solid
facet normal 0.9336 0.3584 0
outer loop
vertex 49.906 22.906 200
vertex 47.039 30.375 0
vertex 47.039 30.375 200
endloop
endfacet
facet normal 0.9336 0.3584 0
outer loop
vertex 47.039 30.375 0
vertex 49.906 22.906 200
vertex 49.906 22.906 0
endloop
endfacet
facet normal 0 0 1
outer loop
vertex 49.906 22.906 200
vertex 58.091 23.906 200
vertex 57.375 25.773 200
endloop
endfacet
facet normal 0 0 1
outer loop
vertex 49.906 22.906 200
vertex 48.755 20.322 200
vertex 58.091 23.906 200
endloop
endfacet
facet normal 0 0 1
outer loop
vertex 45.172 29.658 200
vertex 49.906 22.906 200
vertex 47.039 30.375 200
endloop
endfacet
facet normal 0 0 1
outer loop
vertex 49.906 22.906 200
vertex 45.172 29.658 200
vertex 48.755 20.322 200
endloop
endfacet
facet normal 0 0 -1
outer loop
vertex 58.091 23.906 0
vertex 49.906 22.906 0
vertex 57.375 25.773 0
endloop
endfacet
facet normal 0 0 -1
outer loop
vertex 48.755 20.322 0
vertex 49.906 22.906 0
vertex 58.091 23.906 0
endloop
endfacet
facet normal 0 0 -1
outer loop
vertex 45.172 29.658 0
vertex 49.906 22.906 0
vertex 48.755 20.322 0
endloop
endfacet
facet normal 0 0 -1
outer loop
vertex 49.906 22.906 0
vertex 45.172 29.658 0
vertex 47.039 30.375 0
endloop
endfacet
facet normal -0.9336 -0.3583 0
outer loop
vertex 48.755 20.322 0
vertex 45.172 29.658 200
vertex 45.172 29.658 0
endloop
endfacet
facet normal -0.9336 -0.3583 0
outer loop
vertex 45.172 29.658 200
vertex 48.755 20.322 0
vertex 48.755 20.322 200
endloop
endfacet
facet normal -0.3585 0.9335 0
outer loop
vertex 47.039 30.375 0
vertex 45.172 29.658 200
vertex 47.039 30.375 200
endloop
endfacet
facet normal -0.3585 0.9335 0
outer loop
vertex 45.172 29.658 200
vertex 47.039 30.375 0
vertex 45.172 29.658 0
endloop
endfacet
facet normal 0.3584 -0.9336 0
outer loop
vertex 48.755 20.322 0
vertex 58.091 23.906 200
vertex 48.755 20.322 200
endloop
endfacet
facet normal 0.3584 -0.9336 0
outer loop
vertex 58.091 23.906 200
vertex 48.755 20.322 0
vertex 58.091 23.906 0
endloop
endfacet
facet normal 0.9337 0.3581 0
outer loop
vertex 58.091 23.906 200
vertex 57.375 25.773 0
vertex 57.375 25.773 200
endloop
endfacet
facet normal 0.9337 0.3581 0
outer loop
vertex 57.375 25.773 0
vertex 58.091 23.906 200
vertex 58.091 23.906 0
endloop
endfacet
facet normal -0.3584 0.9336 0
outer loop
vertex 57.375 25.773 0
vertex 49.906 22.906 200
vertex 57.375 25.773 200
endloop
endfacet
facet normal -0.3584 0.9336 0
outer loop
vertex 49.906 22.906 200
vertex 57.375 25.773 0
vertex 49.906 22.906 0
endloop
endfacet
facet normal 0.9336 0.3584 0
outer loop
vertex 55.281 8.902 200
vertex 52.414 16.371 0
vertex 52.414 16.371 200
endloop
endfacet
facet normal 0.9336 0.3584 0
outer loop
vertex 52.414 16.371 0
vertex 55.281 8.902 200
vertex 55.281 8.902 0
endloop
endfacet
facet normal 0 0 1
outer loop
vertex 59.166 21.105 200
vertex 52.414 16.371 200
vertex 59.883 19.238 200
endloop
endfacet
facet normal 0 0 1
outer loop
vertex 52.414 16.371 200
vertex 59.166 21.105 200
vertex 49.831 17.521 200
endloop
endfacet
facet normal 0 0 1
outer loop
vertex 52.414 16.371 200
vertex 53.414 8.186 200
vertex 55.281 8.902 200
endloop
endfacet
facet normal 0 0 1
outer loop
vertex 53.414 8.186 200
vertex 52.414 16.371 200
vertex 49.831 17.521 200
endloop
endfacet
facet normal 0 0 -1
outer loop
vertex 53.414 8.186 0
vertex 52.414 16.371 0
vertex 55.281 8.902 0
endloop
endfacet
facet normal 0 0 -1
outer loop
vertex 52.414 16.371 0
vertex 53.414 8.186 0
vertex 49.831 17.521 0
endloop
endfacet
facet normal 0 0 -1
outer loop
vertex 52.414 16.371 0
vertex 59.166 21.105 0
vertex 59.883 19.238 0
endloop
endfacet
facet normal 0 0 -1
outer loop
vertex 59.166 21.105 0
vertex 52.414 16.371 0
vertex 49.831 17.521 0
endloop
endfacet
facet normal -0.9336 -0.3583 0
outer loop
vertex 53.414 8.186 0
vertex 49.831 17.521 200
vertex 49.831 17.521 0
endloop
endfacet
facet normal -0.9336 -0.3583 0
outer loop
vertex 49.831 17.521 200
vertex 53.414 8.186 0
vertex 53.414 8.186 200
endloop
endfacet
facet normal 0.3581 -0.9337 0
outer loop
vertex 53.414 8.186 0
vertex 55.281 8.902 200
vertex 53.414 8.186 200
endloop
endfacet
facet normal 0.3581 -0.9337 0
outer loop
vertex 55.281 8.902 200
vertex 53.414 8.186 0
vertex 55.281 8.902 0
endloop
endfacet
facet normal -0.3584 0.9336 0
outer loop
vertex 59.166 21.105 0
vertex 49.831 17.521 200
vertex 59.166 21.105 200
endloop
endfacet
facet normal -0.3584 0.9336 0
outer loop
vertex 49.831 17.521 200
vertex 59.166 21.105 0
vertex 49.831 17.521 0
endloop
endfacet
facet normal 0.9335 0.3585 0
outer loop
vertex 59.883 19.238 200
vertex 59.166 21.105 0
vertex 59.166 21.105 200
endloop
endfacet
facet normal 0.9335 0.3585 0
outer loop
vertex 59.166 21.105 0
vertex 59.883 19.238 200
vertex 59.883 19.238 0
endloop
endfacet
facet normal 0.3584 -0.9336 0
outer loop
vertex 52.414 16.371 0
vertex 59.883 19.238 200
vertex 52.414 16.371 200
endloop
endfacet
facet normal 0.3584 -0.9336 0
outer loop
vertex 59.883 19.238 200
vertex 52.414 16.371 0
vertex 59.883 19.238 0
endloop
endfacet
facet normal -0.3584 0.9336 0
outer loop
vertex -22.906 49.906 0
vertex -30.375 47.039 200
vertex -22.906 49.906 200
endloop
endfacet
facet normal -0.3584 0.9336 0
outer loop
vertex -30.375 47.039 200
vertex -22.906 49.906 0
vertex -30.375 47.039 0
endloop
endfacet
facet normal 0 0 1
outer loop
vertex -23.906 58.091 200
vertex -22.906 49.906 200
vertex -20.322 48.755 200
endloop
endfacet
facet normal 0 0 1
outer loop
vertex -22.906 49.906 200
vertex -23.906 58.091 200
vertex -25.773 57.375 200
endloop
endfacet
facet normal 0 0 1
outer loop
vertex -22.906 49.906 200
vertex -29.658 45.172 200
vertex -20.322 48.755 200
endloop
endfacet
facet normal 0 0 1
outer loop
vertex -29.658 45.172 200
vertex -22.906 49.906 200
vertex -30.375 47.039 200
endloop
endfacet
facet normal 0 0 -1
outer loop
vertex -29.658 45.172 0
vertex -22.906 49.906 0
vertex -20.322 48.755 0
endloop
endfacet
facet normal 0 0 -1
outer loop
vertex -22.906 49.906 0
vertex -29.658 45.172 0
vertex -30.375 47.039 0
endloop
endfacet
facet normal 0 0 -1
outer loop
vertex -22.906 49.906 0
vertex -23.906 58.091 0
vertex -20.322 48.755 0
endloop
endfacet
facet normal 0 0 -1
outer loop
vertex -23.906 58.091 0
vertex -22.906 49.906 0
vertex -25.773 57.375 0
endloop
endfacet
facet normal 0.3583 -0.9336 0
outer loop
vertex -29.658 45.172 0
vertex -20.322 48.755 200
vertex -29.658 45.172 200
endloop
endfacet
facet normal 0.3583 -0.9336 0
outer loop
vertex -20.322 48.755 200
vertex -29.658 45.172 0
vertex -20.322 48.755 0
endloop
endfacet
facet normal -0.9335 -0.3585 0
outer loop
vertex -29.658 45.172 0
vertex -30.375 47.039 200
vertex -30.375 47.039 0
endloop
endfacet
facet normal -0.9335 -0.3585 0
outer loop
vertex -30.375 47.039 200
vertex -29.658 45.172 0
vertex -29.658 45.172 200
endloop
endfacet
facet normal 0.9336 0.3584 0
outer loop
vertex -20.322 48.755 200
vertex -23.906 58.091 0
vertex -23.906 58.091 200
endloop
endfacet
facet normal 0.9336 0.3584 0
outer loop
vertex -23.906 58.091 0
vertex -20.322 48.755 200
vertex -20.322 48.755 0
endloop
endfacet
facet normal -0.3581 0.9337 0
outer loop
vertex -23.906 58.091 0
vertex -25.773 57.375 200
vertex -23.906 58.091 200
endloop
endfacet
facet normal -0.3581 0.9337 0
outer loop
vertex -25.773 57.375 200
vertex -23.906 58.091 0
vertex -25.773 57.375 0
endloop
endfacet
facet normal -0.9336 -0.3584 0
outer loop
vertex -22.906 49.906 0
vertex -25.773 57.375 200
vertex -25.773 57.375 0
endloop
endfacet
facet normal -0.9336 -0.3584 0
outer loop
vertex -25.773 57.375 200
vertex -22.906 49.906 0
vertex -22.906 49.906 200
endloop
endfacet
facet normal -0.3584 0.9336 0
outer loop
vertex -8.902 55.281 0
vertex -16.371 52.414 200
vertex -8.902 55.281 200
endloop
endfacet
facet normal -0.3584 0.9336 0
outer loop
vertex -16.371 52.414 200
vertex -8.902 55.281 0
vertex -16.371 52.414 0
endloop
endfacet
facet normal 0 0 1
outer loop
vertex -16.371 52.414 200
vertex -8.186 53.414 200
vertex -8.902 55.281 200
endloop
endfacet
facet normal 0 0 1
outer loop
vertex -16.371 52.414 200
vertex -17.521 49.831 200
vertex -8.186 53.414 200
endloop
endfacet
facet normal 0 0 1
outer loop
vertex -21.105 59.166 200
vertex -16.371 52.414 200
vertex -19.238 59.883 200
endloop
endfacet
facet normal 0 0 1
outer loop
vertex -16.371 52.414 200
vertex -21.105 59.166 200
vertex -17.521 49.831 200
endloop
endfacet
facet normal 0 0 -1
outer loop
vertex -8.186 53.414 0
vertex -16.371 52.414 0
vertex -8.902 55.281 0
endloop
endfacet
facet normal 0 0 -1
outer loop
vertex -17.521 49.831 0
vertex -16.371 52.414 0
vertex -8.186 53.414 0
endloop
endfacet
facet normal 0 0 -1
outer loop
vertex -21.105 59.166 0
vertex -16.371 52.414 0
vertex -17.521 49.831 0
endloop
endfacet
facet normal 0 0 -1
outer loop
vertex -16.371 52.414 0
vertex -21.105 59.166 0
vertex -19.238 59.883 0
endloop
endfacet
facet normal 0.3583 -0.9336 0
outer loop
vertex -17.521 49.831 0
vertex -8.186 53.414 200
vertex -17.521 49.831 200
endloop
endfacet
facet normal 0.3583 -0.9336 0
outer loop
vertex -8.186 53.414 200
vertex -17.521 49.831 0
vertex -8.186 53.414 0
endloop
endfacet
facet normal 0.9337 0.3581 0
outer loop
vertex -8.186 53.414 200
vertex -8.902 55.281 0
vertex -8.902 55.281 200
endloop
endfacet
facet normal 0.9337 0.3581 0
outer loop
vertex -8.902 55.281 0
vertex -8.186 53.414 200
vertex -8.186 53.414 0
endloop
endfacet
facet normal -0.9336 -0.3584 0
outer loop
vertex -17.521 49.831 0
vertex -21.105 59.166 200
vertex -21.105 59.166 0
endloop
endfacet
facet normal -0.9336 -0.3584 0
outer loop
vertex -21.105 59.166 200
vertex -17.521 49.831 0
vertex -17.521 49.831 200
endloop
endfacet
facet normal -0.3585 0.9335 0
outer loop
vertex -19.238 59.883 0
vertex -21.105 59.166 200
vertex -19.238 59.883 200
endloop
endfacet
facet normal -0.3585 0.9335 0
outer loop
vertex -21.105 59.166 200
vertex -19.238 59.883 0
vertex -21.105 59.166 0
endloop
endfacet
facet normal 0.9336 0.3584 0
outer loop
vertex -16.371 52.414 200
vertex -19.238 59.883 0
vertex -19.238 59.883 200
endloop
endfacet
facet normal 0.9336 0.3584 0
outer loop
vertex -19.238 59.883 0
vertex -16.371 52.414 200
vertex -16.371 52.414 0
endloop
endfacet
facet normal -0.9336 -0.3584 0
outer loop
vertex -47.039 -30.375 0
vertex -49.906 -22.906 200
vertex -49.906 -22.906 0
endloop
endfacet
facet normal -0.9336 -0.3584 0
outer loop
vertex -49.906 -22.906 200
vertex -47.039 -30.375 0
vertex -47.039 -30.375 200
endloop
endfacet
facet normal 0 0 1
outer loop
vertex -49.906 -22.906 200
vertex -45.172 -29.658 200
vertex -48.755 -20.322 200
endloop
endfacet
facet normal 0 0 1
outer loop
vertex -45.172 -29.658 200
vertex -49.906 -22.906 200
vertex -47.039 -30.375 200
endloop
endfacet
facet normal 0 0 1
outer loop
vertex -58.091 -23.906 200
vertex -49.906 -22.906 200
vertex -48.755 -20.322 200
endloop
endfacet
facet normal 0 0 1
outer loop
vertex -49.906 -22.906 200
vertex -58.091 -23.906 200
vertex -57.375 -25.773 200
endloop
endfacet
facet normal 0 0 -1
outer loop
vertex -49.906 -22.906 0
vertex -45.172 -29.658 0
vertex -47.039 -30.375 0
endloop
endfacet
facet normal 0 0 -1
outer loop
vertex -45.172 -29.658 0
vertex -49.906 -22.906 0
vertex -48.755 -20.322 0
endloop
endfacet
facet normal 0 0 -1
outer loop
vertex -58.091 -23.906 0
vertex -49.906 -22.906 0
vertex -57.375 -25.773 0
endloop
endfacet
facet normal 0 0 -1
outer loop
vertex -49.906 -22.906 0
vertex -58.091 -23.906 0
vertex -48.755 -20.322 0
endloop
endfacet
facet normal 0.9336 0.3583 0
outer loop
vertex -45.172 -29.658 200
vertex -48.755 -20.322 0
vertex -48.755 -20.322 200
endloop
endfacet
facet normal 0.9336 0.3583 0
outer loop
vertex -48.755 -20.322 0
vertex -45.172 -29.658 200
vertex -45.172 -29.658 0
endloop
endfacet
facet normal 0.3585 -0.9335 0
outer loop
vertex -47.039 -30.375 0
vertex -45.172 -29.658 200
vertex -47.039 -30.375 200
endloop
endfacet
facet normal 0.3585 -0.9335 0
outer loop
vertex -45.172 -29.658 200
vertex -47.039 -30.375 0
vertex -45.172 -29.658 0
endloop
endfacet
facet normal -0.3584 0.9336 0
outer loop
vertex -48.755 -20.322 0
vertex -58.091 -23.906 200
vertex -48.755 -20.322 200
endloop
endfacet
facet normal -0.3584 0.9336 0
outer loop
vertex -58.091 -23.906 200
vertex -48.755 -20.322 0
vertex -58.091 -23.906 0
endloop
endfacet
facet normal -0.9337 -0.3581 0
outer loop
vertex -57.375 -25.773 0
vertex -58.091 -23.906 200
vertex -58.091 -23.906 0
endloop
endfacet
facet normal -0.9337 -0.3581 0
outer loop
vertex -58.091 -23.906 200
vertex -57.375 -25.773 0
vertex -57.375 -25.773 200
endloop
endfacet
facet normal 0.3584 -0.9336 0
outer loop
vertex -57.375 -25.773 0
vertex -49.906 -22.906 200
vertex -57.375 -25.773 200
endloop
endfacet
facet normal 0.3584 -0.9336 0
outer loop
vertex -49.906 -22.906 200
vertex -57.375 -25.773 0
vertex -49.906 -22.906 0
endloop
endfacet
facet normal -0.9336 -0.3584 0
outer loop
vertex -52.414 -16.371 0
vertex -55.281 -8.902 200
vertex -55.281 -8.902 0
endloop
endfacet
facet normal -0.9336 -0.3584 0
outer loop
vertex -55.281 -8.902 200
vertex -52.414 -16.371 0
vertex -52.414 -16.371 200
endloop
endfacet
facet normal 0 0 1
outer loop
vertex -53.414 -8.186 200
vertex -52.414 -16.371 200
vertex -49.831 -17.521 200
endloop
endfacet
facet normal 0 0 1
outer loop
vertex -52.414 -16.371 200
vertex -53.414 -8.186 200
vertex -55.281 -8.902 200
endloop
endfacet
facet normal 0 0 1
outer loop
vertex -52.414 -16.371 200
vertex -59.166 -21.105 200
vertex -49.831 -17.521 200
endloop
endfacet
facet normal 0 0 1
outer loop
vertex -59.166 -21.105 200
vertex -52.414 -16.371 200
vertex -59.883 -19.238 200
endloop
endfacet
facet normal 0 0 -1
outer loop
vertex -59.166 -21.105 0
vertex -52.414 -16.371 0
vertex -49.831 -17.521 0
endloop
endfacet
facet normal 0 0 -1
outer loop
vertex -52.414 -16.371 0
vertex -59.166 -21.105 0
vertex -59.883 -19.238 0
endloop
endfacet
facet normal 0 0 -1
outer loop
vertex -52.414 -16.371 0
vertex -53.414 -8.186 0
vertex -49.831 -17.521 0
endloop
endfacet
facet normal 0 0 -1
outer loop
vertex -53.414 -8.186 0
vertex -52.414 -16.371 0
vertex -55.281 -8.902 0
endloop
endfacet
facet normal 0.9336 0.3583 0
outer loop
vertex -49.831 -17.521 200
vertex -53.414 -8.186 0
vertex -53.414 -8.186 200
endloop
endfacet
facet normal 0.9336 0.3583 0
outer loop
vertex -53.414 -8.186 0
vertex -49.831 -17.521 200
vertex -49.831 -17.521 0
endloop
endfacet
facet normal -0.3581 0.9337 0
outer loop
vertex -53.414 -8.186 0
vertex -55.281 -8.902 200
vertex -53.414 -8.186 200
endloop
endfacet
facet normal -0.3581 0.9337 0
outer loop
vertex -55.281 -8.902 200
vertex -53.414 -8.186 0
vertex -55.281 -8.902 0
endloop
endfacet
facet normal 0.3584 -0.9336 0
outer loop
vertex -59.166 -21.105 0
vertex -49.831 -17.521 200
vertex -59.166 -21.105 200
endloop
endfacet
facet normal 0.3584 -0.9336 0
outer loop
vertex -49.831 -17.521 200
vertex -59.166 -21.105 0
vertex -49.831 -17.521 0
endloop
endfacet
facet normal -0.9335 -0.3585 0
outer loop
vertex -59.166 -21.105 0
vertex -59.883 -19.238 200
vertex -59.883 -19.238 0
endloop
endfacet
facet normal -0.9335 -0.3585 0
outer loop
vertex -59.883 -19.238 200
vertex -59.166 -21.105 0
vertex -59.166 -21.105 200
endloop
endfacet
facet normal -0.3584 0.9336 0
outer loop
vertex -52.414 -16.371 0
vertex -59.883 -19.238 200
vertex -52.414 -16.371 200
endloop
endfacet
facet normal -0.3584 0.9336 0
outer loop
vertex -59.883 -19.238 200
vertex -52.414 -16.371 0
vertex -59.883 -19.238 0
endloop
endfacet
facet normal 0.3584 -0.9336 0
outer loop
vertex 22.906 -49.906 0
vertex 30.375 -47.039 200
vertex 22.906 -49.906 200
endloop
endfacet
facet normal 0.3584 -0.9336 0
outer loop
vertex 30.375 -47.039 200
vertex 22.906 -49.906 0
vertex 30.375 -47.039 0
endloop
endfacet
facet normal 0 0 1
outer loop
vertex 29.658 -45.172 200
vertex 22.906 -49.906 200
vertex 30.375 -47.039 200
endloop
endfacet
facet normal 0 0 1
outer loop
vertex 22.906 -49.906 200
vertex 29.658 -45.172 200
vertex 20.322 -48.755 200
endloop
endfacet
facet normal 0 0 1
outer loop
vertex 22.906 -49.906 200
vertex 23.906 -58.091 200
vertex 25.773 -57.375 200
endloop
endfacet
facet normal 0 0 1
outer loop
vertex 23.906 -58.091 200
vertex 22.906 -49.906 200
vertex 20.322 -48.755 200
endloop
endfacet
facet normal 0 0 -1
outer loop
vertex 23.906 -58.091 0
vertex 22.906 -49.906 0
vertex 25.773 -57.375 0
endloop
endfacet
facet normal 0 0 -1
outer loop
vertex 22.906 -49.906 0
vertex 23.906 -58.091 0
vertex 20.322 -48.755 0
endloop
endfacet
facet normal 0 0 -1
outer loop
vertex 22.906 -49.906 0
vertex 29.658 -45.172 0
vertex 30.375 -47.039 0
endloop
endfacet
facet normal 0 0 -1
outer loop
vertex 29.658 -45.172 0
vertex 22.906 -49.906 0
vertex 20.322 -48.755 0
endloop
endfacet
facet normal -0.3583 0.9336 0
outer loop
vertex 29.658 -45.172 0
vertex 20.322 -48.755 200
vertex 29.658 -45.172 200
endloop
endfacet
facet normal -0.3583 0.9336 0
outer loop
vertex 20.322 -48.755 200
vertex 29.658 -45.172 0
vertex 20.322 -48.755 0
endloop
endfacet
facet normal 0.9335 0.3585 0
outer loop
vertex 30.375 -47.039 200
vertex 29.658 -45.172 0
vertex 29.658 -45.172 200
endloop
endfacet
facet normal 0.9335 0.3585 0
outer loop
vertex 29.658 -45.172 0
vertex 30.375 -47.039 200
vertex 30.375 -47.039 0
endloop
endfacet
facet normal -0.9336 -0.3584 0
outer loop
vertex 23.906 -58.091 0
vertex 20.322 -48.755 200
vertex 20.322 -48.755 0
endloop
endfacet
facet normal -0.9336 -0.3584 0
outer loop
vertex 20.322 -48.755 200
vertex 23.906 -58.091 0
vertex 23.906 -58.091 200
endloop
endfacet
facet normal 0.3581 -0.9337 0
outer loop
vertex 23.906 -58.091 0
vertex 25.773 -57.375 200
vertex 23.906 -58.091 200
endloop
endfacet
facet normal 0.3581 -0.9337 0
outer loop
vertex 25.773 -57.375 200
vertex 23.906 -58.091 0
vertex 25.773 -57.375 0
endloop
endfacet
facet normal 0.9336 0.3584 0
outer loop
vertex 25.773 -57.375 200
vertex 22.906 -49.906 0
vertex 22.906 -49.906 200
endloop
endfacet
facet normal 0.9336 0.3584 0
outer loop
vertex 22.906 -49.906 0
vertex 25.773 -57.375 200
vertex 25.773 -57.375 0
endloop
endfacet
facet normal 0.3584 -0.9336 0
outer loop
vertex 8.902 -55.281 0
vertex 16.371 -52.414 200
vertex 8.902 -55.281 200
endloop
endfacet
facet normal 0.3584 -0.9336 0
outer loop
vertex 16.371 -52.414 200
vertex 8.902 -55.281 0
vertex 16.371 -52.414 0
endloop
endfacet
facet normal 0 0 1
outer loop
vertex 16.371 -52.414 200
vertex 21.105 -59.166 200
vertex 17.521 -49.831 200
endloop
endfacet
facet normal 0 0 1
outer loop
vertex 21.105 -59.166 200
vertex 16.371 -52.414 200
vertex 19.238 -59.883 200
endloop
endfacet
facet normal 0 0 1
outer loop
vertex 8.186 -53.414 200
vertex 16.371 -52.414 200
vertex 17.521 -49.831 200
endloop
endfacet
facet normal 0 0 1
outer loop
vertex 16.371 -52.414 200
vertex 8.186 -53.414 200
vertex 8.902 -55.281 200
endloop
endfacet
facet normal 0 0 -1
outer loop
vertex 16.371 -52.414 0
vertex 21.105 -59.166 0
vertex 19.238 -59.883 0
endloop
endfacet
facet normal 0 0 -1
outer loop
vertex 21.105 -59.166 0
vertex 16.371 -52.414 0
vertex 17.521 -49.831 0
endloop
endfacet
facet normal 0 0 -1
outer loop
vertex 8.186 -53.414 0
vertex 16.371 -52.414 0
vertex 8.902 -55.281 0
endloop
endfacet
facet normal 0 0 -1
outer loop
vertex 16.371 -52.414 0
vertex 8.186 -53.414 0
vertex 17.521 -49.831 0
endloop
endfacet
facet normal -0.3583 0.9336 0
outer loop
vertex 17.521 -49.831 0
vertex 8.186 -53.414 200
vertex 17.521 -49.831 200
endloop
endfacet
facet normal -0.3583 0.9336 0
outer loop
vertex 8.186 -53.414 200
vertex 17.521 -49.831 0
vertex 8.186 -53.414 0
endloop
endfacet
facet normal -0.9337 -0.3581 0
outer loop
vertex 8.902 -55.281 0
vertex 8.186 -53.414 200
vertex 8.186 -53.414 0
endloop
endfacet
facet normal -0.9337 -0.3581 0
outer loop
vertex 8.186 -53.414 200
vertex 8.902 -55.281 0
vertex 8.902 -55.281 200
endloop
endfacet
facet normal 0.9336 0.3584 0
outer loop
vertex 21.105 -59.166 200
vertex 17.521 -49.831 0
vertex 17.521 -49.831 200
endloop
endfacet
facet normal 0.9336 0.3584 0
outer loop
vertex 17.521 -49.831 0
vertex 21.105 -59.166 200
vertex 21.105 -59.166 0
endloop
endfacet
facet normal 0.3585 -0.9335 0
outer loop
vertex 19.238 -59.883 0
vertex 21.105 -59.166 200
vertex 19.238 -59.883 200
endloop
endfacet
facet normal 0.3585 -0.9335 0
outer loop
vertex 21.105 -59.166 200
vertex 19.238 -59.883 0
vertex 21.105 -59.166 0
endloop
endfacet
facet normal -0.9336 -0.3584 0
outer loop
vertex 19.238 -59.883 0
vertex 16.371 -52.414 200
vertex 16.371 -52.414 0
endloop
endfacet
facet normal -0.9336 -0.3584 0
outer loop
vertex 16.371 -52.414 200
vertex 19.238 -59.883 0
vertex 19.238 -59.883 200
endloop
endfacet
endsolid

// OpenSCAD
// file: config.scad
$fn = 160;

body_height = 1800;
skin_int_dia = 110;

wings_thickness = 3;
wings_nb = 4;
wings_m = 200;
wings_n = 130;
wings_p = 127;
wings_E = 138;

ring_ext_dia = skin_int_dia - 0.4;
// main file
include <config.scad>;

module wing_brackets() {
     n = wings_nb;
     diameter = 10;

     module bracket() {
          translate([0, wings_thickness/2, 0]) {
               cube([2, 10, 200]);
               cube([10, 2, 200]);
          }
     }

     for (i = [0:n])
          rotate([0, 0, i * 360 / n + 21])
               translate([ring_ext_dia/2 - 2, 0, 0]) {
               bracket();

               mirror([0, 1, 0])
                    bracket();
          }
}

wing_brackets();
